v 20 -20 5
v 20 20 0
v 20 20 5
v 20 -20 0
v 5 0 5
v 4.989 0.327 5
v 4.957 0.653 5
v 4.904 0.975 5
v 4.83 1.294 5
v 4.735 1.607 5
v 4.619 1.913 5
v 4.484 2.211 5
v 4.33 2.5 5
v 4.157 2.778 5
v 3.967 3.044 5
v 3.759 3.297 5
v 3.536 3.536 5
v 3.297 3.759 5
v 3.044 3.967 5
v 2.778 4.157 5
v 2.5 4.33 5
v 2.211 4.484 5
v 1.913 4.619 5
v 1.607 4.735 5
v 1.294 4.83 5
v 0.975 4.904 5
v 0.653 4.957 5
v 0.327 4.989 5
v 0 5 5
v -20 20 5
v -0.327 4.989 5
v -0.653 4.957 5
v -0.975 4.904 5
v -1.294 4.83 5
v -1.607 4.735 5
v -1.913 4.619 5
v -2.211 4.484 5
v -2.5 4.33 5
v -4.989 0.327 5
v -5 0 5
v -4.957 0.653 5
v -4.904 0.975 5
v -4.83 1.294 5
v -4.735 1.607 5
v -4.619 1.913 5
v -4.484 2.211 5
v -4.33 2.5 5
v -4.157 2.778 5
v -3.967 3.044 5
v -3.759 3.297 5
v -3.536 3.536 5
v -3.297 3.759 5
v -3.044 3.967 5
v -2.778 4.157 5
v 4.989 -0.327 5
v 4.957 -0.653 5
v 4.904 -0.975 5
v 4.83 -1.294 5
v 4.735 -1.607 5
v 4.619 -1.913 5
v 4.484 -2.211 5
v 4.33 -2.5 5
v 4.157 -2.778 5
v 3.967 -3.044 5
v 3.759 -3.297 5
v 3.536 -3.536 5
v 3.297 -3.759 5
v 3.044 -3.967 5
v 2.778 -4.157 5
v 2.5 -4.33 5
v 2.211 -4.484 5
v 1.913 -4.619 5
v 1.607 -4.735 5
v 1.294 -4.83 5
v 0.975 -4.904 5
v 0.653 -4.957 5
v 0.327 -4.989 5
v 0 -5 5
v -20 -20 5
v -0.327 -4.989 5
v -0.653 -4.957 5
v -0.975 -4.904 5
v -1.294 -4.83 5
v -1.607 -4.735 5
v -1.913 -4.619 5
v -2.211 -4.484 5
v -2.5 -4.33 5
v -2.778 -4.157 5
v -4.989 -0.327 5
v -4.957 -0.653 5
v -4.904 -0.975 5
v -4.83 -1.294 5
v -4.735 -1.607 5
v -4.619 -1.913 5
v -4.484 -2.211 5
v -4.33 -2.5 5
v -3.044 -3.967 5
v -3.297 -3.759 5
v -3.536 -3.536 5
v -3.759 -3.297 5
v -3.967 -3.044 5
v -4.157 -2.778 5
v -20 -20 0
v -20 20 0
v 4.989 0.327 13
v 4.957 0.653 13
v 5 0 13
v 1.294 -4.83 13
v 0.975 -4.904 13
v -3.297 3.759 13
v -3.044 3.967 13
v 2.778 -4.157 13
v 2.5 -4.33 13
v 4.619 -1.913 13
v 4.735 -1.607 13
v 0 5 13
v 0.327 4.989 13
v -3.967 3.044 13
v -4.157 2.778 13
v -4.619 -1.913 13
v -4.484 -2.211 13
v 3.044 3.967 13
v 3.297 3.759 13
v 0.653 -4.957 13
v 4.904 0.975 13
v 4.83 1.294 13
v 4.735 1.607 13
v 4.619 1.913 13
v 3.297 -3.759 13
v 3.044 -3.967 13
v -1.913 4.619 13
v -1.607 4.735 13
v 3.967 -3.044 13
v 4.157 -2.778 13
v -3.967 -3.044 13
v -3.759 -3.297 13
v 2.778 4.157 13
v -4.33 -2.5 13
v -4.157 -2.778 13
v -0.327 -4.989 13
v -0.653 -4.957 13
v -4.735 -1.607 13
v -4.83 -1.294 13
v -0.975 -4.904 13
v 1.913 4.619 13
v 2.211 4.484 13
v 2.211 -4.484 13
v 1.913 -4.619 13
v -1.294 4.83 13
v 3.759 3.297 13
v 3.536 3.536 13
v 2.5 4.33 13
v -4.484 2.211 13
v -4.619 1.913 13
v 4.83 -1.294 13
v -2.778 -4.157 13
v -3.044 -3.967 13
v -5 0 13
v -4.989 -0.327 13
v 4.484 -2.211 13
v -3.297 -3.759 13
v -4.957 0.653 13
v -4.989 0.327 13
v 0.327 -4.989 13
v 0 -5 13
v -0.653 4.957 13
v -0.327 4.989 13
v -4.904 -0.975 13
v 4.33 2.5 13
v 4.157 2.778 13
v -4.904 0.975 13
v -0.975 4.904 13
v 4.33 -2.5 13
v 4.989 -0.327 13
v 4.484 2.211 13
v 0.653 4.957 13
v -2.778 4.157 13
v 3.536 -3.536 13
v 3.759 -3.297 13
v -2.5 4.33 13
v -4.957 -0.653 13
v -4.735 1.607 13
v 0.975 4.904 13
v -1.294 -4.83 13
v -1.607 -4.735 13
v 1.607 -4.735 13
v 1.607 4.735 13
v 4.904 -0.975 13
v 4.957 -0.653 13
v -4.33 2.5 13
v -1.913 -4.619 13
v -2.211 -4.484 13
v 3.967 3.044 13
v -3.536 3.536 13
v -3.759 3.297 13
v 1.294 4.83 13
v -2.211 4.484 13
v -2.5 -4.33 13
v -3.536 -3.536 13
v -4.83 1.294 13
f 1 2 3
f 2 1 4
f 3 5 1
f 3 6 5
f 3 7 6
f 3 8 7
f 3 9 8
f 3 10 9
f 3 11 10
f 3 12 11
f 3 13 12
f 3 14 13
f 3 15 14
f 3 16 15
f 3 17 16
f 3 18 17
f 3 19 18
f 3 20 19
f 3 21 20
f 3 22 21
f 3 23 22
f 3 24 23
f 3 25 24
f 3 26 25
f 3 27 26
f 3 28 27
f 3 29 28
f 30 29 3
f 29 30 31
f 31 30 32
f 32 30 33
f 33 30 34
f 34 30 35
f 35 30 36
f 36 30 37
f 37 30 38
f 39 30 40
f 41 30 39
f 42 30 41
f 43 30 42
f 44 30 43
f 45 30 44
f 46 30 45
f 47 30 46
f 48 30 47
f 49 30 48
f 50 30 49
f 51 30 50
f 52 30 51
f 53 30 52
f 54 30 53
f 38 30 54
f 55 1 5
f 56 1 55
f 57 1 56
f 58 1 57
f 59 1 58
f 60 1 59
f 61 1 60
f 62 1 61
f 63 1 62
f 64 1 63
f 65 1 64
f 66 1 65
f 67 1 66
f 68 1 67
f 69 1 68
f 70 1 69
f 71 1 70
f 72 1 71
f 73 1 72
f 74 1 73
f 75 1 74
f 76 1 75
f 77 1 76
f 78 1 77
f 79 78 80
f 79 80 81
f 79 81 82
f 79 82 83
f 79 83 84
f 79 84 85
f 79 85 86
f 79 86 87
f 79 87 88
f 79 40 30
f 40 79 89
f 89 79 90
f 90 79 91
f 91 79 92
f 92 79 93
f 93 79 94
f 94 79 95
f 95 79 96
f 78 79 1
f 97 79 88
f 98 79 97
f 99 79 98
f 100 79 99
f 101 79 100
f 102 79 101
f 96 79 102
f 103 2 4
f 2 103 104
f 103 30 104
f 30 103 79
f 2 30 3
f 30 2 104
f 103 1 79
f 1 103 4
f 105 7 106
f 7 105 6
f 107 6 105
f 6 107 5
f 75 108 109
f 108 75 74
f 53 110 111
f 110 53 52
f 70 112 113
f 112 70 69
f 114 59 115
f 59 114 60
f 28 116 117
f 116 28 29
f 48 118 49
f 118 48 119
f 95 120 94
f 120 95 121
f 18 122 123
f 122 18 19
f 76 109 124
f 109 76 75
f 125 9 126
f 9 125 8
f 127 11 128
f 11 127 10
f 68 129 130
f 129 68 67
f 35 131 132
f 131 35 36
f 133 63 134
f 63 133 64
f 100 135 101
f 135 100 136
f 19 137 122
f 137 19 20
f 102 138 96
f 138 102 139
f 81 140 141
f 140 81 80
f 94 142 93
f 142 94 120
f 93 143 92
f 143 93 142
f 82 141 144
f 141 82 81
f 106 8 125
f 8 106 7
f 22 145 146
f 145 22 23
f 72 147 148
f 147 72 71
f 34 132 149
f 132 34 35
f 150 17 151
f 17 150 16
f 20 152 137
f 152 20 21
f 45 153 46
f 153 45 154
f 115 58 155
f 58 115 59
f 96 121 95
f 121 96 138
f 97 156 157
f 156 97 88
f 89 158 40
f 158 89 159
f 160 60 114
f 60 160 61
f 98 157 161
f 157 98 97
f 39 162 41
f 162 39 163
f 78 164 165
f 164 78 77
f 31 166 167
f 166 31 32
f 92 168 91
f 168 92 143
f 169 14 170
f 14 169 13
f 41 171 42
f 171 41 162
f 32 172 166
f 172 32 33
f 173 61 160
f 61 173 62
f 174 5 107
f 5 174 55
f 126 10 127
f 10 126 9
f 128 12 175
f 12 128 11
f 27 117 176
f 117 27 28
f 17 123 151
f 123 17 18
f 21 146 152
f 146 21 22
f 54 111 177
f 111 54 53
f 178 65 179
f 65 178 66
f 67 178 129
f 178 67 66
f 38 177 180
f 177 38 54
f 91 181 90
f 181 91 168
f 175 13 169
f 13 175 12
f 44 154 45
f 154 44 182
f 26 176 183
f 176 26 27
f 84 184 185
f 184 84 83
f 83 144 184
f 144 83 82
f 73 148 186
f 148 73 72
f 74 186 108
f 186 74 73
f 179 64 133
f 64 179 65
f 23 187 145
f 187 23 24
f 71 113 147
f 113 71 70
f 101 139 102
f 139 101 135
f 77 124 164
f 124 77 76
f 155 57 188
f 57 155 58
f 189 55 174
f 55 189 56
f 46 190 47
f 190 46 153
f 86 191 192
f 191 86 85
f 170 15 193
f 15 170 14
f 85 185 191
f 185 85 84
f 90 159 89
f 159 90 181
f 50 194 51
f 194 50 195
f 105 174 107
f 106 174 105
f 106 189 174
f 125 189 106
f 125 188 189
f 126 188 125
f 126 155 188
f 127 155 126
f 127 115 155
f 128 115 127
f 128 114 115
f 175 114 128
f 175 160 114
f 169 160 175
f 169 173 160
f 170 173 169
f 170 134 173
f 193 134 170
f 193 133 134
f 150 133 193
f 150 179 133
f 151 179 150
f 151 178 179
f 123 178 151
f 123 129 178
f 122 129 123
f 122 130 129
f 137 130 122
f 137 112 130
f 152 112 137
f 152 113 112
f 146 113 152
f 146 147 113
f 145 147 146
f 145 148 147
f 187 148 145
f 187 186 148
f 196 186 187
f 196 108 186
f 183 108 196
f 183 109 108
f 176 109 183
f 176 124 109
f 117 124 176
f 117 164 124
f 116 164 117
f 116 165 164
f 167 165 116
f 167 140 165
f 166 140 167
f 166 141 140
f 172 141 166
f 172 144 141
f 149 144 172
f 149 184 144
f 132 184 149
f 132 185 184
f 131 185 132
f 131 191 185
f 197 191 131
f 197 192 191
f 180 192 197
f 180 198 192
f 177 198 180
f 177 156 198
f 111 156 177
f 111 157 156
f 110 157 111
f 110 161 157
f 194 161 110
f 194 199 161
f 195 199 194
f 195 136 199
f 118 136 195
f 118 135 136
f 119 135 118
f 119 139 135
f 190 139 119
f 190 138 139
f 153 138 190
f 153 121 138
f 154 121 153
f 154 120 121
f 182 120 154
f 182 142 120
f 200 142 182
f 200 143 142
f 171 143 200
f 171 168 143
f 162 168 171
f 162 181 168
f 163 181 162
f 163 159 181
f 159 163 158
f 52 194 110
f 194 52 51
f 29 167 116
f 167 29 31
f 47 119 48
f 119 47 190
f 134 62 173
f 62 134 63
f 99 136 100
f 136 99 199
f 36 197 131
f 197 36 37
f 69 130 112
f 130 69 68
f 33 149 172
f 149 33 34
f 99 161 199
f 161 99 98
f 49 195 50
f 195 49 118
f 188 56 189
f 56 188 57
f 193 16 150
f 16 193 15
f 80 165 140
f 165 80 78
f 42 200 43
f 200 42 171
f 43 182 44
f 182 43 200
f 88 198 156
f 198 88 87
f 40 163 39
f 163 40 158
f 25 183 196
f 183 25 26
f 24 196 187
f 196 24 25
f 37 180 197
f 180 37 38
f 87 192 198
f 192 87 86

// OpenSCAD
// Plate 40x40x5 centred in XY, base at z=0; boss d10, 8 mm tall on top (overlaps slightly for union)
$fn=96;
union(){
  translate([-20,-20,0]) cube([40,40,5]);
  cylinder(d=10,h=13);
}
